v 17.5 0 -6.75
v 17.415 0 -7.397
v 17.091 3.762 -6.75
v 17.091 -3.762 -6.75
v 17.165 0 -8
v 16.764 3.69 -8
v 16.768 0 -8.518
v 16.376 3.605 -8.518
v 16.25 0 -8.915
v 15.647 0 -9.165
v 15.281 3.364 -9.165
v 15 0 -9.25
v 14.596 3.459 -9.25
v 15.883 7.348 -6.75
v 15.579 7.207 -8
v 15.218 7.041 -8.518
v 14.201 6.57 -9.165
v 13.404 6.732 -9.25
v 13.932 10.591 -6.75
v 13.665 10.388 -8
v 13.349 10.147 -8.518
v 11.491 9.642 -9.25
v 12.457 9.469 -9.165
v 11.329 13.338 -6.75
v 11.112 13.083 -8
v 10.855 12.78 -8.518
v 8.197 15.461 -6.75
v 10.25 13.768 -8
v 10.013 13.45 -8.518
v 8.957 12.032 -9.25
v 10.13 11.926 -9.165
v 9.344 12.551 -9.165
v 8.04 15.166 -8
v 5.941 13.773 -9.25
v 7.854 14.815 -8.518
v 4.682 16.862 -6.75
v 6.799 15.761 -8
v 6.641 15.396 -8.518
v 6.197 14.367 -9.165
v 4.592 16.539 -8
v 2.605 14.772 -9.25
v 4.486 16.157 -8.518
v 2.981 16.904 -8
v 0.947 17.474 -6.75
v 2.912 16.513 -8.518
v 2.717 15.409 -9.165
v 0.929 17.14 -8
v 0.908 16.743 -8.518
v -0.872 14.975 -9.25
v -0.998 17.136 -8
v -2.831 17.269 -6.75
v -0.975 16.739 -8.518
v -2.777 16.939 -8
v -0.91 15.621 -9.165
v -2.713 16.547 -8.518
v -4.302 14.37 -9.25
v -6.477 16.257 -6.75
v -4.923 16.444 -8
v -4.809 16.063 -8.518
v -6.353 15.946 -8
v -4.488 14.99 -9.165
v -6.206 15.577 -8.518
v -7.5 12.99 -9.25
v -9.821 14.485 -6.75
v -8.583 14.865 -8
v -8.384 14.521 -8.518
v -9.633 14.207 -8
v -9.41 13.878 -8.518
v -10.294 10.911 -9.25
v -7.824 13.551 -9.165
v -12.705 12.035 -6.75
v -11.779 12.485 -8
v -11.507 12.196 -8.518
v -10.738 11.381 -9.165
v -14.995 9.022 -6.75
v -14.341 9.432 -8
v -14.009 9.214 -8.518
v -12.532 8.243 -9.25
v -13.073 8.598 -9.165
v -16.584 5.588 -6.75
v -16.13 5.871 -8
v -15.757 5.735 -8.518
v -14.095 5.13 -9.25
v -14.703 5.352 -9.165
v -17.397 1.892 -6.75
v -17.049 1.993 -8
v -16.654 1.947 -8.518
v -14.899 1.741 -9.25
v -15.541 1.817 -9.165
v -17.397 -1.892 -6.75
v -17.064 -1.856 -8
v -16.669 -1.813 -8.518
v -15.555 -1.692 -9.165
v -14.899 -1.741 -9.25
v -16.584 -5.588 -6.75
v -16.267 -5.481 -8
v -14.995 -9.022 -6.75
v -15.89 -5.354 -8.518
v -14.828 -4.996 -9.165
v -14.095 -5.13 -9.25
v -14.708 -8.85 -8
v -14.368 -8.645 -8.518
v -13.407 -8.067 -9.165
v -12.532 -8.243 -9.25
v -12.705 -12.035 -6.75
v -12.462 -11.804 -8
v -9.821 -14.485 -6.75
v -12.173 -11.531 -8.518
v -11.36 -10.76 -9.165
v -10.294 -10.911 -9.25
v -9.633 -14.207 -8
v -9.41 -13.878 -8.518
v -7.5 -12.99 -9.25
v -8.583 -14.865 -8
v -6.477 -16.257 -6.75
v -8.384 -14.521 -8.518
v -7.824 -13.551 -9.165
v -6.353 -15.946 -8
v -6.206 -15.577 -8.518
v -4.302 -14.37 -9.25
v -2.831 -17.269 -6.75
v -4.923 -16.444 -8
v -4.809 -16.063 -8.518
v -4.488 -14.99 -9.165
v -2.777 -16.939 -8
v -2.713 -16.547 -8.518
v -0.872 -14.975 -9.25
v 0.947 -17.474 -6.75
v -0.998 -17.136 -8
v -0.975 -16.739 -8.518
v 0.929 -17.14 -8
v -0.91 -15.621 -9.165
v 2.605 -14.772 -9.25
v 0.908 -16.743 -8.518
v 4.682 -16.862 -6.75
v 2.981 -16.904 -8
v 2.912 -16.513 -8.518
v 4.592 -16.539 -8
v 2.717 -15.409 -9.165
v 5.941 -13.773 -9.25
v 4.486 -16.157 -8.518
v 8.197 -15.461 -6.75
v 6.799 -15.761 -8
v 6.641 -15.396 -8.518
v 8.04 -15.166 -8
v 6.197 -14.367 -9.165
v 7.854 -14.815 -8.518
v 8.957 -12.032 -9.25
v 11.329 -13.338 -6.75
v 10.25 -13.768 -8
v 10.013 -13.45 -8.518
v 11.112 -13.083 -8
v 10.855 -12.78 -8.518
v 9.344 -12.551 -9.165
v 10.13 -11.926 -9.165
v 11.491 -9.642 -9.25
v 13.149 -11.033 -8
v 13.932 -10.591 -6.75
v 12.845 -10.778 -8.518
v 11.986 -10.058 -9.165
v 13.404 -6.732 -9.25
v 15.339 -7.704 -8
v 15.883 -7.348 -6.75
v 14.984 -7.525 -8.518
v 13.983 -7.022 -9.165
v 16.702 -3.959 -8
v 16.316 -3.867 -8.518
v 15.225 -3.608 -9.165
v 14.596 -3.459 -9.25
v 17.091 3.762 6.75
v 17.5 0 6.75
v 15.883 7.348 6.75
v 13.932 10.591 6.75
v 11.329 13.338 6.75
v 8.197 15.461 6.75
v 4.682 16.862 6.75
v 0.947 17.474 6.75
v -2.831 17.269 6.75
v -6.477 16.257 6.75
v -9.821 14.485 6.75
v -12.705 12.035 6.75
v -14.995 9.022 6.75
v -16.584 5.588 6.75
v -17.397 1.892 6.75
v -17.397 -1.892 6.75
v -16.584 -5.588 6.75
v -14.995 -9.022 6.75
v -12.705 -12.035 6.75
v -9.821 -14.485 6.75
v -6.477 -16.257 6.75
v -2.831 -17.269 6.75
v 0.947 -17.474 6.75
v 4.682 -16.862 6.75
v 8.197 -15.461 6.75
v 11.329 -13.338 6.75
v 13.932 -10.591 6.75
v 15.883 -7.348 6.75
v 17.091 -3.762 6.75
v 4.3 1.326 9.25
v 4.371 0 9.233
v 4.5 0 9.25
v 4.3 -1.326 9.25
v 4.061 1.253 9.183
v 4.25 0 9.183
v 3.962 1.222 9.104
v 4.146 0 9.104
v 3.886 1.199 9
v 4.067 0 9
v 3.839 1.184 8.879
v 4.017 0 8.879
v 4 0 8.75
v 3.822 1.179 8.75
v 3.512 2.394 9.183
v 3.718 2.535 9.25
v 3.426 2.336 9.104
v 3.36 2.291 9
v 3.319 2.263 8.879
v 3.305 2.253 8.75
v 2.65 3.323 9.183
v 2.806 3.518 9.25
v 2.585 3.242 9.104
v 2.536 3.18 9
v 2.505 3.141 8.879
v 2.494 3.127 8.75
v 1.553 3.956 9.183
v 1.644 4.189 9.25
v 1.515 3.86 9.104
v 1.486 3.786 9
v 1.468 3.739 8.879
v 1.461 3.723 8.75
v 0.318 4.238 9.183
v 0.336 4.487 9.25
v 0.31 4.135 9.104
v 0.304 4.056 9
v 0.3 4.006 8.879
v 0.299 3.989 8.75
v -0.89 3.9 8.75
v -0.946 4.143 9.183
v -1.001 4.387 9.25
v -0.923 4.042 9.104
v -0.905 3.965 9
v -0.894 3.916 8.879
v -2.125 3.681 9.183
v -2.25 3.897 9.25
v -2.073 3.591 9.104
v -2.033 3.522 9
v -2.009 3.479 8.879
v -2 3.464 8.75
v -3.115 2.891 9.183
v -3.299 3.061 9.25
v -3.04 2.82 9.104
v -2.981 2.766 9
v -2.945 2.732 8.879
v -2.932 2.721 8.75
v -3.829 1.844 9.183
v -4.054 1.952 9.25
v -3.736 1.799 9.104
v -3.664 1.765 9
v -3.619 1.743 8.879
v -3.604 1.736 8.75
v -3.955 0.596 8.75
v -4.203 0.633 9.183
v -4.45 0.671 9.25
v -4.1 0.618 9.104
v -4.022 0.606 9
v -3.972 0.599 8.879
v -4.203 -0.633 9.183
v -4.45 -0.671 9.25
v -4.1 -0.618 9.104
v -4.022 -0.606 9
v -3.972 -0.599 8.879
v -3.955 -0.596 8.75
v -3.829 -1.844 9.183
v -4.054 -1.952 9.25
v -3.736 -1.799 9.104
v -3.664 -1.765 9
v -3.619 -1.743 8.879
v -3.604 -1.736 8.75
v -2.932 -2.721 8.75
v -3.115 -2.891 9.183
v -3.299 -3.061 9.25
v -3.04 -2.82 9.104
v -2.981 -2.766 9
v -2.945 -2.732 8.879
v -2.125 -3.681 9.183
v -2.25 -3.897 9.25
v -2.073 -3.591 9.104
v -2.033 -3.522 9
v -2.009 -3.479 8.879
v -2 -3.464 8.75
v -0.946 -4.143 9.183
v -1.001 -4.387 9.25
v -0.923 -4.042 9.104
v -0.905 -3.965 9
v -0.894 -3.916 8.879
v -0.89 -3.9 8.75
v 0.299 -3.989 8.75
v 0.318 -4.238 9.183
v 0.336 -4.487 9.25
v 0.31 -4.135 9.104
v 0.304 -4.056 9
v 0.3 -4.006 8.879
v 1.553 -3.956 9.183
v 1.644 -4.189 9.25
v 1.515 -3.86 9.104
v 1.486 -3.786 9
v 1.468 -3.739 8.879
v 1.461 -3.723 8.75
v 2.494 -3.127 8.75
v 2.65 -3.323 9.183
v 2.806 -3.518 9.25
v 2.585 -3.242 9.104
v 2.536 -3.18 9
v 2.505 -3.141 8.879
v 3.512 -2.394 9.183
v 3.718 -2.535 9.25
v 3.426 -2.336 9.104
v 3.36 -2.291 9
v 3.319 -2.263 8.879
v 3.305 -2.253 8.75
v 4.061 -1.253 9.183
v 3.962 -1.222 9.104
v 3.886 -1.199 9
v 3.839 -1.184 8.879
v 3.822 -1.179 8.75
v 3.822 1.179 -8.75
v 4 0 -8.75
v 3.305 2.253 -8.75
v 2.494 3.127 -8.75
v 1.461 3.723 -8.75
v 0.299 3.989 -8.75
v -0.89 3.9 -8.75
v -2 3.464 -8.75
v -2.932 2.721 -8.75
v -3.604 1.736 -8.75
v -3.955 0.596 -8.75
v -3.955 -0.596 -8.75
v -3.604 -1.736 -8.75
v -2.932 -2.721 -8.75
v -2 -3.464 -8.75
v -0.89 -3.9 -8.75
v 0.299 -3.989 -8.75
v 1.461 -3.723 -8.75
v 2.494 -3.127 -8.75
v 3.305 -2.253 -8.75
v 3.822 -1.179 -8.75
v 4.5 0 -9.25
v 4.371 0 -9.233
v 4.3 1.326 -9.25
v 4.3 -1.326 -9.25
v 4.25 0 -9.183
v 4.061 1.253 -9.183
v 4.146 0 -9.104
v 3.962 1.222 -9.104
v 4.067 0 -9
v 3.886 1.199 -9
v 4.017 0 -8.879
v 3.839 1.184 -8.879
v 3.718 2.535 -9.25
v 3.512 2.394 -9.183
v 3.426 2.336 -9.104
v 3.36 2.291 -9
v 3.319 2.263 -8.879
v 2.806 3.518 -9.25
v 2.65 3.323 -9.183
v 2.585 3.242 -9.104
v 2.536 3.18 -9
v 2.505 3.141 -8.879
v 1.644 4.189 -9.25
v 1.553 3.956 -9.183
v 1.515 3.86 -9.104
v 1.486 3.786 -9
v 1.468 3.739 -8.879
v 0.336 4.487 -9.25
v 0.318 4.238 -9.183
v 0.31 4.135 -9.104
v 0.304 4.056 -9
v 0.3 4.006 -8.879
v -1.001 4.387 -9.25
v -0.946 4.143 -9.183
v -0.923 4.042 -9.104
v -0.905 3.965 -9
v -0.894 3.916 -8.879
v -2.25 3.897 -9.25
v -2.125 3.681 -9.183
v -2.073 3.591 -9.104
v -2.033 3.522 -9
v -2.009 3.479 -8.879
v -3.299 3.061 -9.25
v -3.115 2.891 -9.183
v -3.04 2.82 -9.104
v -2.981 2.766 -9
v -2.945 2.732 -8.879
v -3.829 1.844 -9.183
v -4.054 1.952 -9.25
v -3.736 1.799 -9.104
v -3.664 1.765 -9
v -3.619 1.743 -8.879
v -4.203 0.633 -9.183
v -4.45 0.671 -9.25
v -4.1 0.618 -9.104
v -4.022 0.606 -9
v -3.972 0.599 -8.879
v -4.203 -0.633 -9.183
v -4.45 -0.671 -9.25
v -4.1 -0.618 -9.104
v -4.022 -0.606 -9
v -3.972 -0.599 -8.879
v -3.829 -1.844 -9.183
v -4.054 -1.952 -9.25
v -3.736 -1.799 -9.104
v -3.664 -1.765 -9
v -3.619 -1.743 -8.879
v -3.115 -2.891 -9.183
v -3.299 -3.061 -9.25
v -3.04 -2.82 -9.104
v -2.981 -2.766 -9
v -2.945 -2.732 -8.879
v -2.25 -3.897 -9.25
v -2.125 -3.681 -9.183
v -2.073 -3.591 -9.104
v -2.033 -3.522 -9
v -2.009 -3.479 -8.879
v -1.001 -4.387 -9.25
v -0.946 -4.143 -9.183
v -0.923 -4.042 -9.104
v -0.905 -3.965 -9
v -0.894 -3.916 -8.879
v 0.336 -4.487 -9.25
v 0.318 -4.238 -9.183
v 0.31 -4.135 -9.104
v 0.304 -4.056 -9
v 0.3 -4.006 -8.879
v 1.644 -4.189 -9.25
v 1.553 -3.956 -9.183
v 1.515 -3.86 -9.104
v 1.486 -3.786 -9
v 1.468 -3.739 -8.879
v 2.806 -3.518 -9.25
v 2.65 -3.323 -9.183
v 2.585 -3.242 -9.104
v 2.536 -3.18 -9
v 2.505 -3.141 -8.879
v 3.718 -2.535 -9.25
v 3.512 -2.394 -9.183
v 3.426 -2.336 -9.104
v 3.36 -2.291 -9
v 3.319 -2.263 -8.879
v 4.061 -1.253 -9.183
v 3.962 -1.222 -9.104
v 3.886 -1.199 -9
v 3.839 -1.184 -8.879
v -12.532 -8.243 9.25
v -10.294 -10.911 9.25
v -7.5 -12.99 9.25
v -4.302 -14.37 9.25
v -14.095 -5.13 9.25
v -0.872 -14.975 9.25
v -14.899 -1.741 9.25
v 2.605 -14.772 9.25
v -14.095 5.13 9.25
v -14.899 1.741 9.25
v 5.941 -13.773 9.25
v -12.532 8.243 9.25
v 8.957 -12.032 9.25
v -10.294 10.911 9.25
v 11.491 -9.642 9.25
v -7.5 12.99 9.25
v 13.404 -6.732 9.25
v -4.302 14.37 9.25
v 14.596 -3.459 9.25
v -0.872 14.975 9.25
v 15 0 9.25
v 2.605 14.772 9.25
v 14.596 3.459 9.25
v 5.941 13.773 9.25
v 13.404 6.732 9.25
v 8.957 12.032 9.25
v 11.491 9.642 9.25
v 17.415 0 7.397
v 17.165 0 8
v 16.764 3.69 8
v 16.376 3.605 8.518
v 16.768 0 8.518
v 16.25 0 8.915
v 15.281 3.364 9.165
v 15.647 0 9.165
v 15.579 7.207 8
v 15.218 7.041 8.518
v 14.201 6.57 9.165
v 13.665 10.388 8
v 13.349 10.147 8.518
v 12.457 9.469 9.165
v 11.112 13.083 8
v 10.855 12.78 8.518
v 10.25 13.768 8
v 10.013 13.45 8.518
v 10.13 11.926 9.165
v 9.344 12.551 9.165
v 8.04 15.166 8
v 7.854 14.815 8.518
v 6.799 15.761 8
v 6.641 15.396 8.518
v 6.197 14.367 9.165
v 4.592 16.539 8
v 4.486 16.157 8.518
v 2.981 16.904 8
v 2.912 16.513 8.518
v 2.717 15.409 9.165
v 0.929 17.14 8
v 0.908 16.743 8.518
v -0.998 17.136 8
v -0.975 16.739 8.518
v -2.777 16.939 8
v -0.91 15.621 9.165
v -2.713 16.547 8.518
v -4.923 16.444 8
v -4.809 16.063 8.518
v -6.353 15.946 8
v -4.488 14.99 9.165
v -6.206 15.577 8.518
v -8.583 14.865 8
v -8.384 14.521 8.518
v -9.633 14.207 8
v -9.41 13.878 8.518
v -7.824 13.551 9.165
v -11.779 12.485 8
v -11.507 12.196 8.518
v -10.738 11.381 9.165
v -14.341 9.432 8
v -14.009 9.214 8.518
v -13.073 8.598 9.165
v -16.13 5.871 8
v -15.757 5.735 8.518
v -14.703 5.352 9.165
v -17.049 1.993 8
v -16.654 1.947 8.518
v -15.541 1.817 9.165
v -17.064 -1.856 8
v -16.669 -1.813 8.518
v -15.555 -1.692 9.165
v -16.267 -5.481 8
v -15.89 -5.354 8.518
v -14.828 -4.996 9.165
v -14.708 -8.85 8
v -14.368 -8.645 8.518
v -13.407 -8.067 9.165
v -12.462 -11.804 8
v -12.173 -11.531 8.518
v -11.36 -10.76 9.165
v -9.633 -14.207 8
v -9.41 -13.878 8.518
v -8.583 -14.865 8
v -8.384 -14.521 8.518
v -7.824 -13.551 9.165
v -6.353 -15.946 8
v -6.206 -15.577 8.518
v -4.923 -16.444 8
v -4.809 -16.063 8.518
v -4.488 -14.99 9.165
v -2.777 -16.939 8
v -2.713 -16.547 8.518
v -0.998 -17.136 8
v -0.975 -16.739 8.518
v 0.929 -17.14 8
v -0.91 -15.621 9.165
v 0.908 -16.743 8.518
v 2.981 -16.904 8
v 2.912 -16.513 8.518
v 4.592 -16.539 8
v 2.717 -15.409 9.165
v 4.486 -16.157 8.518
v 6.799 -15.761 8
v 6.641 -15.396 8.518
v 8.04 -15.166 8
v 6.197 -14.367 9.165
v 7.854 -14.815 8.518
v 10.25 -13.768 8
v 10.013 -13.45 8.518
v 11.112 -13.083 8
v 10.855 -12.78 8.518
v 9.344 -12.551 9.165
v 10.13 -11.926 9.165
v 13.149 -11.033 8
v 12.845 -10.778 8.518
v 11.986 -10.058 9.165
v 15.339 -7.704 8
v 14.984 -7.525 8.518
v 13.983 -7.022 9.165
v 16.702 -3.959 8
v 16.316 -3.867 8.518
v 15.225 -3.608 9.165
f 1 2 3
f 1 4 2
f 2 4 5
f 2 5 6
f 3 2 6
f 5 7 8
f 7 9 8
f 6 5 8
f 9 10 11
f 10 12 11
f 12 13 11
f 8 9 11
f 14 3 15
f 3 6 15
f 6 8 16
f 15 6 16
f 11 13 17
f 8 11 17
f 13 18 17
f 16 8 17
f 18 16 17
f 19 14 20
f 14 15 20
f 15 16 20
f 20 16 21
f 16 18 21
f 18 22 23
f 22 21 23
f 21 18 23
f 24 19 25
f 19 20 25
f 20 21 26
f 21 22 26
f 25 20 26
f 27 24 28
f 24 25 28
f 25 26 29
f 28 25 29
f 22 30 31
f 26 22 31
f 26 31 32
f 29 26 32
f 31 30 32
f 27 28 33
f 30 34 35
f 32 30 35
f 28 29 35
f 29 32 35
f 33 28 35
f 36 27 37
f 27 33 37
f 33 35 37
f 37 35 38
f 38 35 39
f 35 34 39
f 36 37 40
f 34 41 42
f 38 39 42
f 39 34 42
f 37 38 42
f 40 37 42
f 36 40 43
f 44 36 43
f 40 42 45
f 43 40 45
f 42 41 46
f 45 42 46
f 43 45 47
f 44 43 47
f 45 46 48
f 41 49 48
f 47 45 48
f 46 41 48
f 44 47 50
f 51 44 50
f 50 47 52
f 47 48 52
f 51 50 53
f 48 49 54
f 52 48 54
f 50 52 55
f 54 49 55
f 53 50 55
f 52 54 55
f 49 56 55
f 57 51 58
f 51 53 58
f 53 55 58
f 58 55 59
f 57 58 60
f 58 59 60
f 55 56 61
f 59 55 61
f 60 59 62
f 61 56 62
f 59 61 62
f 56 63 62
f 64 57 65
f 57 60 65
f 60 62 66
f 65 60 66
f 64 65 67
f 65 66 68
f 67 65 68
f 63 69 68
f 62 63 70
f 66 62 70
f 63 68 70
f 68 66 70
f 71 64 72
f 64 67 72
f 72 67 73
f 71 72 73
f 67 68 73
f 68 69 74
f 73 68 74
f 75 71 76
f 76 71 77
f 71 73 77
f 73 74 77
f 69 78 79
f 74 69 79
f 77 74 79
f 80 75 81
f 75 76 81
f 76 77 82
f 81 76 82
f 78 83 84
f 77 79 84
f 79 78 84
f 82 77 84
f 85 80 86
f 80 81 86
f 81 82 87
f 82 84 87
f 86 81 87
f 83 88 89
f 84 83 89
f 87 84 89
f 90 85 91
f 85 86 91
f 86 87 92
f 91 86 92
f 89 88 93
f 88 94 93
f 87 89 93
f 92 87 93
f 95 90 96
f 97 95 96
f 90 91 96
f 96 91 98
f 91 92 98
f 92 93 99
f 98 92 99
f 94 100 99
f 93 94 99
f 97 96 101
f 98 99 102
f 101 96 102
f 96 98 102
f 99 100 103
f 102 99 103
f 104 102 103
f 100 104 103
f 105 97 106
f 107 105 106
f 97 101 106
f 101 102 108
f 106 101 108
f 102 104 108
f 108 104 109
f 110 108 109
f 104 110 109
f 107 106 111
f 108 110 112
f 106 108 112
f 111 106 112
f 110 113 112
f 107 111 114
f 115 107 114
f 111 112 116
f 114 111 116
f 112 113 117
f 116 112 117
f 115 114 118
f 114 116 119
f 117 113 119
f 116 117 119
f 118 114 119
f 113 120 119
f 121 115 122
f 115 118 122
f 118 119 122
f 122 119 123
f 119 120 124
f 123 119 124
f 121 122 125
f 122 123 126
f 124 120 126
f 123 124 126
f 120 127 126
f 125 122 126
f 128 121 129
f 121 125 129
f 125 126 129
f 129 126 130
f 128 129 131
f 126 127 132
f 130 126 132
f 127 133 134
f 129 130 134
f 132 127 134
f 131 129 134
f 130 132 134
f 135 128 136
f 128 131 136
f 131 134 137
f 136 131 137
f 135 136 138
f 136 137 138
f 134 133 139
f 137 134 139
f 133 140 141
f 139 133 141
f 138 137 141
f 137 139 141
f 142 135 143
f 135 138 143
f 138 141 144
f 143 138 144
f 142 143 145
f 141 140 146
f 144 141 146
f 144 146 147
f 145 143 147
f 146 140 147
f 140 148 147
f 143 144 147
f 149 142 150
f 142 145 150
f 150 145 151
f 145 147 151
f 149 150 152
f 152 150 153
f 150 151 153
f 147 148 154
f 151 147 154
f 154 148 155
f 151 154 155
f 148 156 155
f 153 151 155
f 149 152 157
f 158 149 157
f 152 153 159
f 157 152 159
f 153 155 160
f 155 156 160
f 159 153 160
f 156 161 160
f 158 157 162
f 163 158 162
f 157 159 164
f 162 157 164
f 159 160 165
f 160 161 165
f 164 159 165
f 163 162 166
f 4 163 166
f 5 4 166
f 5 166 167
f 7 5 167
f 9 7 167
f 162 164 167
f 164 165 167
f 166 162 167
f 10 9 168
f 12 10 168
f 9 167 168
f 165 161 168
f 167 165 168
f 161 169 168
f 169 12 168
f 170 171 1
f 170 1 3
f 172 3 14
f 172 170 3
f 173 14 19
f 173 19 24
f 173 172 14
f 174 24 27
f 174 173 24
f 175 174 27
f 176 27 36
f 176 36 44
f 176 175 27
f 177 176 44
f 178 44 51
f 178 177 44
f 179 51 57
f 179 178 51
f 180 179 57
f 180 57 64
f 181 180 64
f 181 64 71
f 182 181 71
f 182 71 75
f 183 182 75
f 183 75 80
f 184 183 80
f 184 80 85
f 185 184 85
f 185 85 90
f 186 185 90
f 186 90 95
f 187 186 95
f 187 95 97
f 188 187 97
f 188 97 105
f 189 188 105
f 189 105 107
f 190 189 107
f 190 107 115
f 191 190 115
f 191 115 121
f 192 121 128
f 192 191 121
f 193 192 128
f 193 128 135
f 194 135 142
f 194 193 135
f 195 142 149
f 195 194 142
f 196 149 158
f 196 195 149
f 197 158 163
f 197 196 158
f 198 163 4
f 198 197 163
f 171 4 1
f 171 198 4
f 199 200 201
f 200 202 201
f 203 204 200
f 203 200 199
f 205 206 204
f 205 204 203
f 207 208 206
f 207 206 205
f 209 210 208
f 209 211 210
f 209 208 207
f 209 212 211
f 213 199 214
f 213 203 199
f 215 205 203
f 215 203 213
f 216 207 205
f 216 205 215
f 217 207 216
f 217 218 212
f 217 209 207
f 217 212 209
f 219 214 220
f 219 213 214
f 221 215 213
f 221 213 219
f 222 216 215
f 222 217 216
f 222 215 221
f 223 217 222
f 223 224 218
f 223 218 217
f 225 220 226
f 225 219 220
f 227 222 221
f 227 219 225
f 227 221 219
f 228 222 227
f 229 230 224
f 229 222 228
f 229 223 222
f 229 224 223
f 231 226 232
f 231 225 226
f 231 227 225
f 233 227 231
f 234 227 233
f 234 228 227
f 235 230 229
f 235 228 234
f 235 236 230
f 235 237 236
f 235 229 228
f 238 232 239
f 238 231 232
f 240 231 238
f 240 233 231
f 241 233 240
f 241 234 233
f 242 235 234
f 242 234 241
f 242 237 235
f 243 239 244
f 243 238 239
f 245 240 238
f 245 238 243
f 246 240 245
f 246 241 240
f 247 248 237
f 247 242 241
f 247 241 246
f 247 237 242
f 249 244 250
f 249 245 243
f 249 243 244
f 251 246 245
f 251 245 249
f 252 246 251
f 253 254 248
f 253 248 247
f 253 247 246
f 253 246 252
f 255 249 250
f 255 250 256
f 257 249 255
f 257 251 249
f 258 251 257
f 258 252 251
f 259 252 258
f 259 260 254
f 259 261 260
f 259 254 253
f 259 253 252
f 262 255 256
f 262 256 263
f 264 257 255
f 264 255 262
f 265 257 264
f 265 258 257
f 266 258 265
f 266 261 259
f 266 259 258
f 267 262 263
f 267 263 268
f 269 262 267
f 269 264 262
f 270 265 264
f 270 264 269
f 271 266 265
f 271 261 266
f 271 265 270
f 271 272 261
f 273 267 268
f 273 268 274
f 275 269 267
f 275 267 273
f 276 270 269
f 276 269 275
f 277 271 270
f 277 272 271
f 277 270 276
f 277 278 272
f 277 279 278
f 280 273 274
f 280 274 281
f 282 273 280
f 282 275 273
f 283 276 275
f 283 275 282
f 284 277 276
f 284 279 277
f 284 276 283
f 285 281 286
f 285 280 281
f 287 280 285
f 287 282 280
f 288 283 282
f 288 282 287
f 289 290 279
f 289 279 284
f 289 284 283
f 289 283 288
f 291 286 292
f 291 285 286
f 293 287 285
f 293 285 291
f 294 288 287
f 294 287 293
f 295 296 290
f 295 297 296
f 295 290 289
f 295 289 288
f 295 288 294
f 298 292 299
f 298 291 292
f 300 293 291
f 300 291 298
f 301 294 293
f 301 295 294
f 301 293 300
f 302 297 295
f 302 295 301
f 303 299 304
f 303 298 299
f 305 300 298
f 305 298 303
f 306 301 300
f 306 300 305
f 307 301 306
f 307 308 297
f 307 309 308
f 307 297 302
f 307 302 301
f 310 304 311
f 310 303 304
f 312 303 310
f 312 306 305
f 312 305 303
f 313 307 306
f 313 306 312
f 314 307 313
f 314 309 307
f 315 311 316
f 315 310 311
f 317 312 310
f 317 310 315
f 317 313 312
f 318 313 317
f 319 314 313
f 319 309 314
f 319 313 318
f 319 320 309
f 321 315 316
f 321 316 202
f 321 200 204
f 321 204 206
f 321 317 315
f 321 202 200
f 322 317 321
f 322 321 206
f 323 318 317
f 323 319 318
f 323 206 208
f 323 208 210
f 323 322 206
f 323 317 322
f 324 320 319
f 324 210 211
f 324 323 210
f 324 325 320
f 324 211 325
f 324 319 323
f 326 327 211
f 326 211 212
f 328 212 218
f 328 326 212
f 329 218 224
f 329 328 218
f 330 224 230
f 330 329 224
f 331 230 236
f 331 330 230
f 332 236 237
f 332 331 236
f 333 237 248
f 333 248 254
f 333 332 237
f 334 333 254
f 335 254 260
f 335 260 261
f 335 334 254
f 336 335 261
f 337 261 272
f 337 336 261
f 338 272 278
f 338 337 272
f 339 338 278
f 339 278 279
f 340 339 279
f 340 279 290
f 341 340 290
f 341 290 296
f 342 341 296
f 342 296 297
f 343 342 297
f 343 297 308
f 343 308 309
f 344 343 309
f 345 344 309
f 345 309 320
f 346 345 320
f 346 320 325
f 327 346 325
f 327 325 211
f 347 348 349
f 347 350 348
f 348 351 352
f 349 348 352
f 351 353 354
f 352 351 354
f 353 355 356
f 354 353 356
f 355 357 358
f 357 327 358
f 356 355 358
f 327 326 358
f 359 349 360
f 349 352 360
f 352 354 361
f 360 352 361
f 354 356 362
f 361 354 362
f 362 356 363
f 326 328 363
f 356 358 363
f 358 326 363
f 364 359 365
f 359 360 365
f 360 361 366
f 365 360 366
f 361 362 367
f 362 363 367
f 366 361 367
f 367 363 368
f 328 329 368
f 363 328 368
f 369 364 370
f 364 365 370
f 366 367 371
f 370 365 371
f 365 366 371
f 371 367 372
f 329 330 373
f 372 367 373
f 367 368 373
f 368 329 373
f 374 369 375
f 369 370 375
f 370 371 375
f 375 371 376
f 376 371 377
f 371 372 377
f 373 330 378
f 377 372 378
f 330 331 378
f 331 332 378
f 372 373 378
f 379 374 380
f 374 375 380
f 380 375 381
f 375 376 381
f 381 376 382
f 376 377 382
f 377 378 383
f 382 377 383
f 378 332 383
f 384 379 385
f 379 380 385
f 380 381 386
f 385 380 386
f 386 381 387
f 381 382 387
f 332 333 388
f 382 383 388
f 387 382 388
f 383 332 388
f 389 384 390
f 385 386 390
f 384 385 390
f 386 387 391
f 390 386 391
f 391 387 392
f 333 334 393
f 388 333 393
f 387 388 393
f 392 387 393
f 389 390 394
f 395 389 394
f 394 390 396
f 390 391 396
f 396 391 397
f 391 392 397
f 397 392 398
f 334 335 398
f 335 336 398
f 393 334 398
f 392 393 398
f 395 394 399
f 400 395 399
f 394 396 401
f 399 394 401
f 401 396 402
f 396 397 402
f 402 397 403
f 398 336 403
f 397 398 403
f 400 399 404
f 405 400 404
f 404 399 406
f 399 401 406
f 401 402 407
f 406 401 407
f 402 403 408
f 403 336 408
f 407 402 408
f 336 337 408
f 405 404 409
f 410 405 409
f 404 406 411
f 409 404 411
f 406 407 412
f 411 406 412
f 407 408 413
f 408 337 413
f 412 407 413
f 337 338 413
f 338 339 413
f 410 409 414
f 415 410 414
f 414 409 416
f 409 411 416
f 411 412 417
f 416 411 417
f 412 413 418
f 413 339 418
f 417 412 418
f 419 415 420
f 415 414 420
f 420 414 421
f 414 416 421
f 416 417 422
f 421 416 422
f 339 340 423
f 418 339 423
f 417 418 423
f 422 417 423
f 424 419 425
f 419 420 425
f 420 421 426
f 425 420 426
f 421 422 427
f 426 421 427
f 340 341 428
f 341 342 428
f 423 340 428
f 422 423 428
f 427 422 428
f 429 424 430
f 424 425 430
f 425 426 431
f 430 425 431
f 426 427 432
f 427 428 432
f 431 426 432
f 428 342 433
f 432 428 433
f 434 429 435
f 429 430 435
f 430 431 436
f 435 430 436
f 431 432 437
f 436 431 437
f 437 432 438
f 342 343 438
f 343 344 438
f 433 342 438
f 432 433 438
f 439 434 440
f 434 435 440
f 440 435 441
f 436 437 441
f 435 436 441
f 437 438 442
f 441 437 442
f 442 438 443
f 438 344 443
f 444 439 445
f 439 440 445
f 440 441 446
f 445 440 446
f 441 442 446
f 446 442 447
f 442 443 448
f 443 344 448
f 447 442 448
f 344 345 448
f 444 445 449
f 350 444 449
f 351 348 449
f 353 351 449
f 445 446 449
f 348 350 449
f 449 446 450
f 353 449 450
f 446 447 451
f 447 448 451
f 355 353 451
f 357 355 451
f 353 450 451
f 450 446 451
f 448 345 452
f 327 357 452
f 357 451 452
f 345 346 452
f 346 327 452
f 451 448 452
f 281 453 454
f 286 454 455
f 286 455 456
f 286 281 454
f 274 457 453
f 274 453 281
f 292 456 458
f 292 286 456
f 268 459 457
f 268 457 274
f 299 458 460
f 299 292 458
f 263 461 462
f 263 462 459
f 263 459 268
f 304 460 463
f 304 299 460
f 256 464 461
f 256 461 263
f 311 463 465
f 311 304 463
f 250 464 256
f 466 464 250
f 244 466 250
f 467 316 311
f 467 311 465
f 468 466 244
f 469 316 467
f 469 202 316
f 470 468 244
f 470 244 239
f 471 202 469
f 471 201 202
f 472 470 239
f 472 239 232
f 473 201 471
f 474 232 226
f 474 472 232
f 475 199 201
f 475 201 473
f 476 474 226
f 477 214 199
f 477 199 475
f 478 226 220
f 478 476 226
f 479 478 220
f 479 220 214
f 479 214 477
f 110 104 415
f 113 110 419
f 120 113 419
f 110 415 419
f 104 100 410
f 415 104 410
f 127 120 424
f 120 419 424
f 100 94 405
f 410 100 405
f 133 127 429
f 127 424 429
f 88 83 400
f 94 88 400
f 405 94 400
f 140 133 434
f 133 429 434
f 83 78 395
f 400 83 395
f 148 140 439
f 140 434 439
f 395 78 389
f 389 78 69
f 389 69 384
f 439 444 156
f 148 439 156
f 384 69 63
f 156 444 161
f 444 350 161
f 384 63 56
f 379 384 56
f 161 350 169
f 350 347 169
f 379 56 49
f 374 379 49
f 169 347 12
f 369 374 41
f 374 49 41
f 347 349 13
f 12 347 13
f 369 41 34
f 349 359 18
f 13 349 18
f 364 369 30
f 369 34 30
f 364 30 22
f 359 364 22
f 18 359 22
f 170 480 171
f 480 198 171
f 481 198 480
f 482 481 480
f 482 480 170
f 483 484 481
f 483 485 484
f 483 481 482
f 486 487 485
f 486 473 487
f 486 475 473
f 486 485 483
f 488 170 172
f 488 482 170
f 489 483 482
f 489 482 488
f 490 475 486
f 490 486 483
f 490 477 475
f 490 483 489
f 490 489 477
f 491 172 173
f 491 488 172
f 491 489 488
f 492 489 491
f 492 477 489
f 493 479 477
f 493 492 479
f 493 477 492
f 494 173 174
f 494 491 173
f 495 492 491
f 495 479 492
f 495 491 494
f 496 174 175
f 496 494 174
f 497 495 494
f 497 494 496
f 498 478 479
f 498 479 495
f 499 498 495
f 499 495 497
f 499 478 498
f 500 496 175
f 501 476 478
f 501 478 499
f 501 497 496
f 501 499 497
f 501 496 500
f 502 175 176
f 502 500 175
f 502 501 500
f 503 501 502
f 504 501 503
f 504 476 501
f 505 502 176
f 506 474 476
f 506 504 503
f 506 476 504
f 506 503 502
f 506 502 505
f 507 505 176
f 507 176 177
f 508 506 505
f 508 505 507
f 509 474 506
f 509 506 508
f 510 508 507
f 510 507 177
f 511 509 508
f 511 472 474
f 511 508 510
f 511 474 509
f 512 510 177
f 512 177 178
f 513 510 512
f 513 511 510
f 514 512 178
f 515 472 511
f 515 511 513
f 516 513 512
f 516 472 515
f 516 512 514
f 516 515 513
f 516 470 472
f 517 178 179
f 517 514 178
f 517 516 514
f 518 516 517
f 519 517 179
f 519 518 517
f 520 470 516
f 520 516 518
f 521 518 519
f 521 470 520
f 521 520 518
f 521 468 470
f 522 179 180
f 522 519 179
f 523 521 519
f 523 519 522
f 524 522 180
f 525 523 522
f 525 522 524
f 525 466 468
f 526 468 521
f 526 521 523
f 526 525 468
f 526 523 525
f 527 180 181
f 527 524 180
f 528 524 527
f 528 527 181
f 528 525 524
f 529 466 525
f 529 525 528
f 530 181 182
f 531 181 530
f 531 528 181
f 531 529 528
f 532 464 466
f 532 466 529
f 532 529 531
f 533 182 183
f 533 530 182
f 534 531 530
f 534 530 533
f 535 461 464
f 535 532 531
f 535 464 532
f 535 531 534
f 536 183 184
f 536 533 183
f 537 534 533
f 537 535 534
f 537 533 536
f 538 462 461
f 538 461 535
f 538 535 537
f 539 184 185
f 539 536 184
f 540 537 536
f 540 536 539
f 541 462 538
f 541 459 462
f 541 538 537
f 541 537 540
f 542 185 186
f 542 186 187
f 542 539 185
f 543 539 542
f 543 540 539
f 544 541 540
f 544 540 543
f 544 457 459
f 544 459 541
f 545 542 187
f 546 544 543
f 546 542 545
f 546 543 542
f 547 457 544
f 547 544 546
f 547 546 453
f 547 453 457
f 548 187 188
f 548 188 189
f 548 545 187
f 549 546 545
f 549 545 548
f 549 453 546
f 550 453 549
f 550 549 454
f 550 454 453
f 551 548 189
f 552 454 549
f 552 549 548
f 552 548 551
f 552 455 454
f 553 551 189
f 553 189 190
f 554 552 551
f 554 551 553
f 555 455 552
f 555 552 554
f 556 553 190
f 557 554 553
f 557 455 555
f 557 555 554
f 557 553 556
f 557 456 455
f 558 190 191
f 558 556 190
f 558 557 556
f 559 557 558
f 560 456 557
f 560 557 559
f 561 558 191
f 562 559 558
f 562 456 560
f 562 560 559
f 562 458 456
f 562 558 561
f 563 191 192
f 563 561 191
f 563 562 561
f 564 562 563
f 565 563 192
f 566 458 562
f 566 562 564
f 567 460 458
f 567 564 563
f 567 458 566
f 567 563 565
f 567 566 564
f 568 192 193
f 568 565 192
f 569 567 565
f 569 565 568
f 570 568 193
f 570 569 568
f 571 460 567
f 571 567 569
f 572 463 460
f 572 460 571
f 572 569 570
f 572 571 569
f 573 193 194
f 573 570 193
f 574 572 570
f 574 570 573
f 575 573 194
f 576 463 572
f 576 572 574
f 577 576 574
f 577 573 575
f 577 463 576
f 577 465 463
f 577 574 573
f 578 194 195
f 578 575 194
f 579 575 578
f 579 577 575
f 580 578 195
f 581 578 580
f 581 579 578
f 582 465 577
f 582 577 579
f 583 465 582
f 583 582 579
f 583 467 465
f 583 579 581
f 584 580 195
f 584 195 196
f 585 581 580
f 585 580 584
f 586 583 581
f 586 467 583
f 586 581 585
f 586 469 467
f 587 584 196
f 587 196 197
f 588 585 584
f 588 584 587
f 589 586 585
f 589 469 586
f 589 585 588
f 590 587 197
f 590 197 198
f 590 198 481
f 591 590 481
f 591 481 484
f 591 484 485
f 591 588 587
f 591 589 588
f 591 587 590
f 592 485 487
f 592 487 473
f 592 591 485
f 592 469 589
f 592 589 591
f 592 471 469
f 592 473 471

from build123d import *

# Parameters (mm, degrees)
SKETCH_1_R      = 17.5
SKETCH_1_R_2    = 4
EXTRUDE_1_DEPTH = 9.25
FILLET_1_R      = 2.5
FILLET_2_R      = 0.5


with BuildPart() as part:
    # 草图1 → 凸台-拉伸1 (new, symmetric)
    with BuildSketch(Plane.XY):
        Circle(SKETCH_1_R)
        Circle(SKETCH_1_R_2, mode=Mode.SUBTRACT)
    extrude(amount=EXTRUDE_1_DEPTH, both=True)

    # 圆角1
    fillet_1_edges = [part.edges().sort_by_distance(p)[0] for p in [
        (-17.5, 0, -9.25),
        (-17.5, 0, 9.25),
    ]]
    fillet(fillet_1_edges, radius=FILLET_1_R)

    # 圆角2
    fillet_2_edges = [part.edges().sort_by_distance(p)[0] for p in [
        (-4, 0, -9.25),
        (-4, 0, 9.25),
    ]]
    fillet(fillet_2_edges, radius=FILLET_2_R)


solid = part.part
